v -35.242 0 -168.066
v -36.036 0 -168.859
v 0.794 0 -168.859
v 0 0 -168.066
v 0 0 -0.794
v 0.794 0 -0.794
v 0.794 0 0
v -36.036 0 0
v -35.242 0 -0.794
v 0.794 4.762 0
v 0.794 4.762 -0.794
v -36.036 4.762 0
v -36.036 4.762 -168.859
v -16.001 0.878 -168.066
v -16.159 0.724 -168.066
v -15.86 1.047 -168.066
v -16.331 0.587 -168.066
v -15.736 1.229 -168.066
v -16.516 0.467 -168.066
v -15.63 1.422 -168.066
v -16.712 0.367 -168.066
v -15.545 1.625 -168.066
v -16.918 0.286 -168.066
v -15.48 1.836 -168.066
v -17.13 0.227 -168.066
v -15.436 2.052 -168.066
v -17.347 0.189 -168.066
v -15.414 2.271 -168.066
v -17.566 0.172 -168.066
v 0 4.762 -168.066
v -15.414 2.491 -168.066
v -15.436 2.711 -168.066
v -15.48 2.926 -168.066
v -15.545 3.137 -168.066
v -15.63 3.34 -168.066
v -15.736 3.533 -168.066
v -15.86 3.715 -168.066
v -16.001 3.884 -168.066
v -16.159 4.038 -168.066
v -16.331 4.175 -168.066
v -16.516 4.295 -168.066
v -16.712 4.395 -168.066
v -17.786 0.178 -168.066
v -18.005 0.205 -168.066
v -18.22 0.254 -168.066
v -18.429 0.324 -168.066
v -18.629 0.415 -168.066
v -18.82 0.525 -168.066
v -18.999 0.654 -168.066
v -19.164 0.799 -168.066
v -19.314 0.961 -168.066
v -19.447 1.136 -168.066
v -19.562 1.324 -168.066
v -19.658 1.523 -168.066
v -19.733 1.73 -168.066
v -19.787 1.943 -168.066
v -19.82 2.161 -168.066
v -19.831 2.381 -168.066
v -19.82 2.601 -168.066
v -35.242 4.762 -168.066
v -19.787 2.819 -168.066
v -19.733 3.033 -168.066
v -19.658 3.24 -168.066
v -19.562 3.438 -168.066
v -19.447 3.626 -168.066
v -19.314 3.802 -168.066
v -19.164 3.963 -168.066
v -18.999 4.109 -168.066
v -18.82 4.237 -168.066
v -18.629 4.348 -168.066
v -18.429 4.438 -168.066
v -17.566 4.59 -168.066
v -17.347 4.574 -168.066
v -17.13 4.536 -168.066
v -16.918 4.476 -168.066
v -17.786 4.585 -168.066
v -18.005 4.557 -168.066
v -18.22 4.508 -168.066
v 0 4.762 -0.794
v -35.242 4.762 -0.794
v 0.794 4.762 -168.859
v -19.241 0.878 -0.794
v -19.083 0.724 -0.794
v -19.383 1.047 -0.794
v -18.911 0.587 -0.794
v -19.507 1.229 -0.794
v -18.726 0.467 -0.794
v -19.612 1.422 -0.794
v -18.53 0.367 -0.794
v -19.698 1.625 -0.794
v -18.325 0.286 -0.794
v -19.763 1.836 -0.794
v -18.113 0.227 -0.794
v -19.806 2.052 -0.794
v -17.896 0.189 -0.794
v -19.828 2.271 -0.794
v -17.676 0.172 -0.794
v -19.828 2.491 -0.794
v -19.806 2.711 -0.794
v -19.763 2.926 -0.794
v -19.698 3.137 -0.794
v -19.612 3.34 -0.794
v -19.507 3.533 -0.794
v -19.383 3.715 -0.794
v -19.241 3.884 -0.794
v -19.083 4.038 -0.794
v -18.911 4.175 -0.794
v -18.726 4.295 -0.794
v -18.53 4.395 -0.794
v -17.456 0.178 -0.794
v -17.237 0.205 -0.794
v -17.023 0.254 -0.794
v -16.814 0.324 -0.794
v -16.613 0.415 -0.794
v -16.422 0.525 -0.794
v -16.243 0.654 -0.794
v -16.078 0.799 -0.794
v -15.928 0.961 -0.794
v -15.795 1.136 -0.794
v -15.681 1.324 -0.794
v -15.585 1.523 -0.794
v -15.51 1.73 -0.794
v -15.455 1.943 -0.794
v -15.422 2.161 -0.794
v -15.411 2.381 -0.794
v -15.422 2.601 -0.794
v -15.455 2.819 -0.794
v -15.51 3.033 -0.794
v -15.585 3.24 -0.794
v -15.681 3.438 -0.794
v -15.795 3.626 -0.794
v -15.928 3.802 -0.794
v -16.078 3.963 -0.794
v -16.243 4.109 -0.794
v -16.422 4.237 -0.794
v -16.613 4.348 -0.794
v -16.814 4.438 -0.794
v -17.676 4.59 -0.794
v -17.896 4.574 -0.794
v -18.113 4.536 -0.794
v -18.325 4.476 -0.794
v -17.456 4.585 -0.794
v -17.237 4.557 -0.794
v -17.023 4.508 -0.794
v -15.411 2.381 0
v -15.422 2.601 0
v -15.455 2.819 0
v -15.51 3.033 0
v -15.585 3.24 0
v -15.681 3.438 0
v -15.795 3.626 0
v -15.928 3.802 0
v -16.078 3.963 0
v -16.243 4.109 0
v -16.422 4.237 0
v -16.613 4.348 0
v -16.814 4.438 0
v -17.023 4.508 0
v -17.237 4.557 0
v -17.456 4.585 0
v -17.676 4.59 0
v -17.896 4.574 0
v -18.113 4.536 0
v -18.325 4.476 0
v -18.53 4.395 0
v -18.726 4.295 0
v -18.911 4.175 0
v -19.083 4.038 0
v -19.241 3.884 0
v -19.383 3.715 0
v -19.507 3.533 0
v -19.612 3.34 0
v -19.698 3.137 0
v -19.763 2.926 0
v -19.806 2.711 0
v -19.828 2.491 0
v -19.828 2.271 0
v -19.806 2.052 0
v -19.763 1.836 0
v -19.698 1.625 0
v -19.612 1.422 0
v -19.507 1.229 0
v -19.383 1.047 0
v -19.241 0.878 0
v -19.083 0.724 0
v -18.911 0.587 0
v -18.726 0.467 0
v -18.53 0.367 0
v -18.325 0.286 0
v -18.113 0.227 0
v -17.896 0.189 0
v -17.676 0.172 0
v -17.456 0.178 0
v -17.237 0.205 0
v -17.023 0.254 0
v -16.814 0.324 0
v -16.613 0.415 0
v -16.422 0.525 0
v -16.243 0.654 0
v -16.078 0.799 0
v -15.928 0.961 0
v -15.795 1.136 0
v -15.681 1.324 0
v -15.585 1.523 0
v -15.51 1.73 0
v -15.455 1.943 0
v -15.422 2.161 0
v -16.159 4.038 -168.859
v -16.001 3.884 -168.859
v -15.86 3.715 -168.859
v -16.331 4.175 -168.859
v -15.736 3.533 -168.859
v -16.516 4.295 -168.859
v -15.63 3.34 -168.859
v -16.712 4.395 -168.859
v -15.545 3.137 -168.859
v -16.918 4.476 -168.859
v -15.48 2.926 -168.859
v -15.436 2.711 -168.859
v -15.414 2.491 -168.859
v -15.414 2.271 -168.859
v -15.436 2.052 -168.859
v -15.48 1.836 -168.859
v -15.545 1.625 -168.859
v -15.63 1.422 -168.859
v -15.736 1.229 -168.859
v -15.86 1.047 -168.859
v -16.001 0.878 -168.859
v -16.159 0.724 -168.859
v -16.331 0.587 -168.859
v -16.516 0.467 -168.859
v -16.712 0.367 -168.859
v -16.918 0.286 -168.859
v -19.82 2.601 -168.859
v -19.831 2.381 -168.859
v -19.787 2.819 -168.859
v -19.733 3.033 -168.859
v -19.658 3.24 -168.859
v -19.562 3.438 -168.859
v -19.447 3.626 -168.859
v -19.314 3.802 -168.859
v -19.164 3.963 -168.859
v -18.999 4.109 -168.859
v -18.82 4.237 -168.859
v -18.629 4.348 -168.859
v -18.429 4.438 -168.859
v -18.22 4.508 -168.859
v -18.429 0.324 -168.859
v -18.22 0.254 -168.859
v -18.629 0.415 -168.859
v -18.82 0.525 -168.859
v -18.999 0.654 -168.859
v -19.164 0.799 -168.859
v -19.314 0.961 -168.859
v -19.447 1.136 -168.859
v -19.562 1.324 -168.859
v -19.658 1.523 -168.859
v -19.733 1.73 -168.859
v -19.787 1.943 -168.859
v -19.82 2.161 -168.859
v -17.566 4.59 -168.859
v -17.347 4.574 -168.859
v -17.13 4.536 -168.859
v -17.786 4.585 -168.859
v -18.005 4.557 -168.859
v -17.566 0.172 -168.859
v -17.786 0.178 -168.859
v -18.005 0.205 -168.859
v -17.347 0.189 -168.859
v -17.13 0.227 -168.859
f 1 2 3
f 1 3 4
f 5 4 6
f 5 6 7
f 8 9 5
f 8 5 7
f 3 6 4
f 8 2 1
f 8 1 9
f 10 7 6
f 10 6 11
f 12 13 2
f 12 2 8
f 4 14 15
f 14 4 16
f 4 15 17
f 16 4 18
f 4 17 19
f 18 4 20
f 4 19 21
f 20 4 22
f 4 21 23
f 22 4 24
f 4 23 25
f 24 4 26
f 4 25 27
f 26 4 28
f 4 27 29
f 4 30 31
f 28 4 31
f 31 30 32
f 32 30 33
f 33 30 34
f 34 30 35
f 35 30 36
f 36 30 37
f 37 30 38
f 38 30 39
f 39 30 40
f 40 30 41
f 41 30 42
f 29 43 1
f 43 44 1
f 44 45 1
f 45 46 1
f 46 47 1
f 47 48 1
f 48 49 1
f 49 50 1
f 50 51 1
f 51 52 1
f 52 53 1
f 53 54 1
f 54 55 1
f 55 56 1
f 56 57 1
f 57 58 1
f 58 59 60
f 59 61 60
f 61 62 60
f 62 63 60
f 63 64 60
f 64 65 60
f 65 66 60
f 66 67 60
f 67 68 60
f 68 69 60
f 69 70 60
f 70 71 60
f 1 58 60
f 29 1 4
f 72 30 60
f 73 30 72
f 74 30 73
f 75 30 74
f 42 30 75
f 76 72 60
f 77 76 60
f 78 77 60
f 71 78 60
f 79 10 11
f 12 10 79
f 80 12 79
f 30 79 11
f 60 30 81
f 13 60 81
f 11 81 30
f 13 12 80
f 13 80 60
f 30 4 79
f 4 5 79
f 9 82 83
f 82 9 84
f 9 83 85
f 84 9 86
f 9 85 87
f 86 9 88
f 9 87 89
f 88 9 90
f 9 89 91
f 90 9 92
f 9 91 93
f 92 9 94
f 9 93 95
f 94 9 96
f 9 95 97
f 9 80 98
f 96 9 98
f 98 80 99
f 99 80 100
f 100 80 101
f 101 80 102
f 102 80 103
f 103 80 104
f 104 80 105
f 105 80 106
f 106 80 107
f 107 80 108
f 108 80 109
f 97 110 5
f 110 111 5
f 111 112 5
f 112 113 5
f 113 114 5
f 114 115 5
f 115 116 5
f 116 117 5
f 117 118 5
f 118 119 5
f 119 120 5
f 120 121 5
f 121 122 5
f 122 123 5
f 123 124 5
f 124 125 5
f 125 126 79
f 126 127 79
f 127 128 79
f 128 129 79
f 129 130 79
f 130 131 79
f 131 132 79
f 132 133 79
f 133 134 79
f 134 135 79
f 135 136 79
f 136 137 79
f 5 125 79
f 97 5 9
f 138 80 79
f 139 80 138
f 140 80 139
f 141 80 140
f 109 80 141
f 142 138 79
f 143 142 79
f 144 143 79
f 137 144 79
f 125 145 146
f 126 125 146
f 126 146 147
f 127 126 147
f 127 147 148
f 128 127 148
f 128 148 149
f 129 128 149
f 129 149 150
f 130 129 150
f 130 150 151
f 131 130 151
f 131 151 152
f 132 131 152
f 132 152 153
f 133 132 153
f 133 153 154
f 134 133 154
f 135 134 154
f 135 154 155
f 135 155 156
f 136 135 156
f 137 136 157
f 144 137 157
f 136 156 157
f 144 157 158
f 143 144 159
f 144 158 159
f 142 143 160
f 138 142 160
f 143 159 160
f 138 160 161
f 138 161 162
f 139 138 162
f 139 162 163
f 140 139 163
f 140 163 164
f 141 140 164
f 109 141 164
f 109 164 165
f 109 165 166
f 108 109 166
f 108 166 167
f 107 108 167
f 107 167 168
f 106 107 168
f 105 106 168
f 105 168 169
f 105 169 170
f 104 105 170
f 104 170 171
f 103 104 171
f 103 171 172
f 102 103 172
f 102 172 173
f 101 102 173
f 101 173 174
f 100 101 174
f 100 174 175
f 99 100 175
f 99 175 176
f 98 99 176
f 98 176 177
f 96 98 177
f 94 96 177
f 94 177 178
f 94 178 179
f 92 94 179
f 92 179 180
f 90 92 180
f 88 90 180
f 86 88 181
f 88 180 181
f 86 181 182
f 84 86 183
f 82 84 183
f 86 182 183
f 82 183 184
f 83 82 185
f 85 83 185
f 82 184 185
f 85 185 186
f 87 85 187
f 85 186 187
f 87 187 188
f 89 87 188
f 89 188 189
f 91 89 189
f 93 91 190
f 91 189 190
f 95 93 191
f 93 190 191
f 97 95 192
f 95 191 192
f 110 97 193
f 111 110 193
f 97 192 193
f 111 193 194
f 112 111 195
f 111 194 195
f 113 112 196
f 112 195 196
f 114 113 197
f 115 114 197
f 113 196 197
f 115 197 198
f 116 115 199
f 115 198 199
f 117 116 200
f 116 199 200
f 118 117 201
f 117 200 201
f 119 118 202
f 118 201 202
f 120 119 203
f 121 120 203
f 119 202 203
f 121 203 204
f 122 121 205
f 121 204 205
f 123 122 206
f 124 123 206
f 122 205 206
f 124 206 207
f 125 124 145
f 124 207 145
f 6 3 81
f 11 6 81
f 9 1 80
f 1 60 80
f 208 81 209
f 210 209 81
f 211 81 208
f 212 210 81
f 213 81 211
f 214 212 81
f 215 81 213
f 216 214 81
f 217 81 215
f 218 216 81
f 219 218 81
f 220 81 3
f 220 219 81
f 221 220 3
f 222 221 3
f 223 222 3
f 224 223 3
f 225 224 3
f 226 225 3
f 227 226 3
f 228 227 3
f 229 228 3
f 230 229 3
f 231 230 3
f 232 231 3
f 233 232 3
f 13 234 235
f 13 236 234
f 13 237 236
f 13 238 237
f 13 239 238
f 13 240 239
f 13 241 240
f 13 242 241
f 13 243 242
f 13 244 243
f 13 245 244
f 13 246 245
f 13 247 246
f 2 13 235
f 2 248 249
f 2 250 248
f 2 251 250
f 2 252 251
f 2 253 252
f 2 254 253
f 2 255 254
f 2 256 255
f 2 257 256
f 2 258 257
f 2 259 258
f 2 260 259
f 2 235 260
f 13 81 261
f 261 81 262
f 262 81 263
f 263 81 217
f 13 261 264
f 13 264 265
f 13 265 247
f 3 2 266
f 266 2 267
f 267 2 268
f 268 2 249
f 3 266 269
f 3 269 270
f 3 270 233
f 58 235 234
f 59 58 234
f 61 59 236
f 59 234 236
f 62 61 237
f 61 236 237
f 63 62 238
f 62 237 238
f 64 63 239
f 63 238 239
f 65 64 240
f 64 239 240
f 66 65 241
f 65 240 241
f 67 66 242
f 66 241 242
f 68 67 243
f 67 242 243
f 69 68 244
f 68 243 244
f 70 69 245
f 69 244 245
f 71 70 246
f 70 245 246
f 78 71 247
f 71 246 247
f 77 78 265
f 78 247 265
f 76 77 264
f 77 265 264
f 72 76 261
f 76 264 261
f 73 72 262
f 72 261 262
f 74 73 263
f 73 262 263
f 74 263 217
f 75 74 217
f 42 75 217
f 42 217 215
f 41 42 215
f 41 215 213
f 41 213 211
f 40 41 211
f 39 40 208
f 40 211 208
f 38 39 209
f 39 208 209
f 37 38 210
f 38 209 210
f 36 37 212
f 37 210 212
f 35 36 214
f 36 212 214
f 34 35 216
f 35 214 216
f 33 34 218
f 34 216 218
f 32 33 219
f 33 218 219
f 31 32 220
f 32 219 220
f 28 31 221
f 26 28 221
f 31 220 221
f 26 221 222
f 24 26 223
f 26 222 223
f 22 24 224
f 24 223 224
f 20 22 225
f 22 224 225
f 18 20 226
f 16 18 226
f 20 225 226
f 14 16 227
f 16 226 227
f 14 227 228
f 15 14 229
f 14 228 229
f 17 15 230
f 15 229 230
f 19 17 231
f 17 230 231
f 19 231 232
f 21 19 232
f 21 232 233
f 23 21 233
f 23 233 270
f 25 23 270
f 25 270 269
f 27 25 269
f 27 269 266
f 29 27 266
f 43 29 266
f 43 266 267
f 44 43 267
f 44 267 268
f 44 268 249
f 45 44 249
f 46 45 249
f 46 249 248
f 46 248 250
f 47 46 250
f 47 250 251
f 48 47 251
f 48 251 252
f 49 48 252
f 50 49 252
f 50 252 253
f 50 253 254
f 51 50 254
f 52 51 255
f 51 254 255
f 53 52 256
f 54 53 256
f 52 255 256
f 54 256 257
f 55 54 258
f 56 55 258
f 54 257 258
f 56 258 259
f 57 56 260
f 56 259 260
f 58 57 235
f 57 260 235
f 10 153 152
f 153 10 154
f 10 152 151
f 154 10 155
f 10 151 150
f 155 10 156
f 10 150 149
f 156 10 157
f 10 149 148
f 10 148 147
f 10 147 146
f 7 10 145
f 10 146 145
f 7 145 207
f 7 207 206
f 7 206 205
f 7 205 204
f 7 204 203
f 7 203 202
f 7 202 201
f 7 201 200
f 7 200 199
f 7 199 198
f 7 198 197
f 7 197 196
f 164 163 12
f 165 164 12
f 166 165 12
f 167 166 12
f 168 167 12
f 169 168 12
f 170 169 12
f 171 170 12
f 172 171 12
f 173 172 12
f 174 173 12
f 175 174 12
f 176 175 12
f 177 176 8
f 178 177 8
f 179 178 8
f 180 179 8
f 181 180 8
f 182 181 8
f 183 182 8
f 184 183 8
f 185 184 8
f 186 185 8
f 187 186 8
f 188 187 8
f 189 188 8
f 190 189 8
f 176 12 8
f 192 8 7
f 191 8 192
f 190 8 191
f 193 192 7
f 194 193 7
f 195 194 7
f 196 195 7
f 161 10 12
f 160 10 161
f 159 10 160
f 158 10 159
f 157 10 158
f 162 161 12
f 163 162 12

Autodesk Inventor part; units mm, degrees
ref_plane "YZ Plane" through (0, 0, 0) normal (1, 0, 0) x (0, 1, 0)
ref_plane "XZ Plane" through (0, 0, 0) normal (0, 1, 0) x (-1, 0, 0)
ref_plane "XY Plane" through (0, 0, 0) normal (0, 0, 1) x (1, 0, 0)
sketch "Sketch1" plane through (0, 0, 0) normal (1, 0, 0) x (0, 1, 0)
  line L0 (0, 0) -> (4.7625, 0)
  line L1 (4.7625, 0) -> (4.7625, -168.8592)
  line L2 (4.7625, -168.8592) -> (0, -168.8592)
  line L3 (0, -168.8592) -> (0, 0)
  dimension "d1" = 4.7625
  dimension "d2" = 168.8592
extrude "Extrusion1" add sketch "Sketch1" along normal blind 0.7937
sketch "Sketch2" plane through (0, 0, -168.8592) normal (0, 0, -1) x (-1, 0, 0)
  line L0 (-0.7937, 0) -> (-0.7937, 4.7625) projected
  line L1 (-0.7937, 0) -> (36.0362, 0)
  line L2 (36.0362, 0) -> (36.0362, 4.7625)
  line L3 (36.0362, 4.7625) -> (-0.7937, 4.7625)
  line L4 (-0.7937, 4.7625) -> (-0.7937, 0)
  point P0 (0, 0)
  dimension "d5" = 36.83
  dimension "d6" = 4.7625
extrude "Extrusion2" add sketch "Sketch2" against normal blind 0.7937
sketch "Sketch3" plane through (-36.0362, 0, -168.8592) normal (-1, 0, 0) x (0, 0, 1)
  line L0 (168.8592, 4.7625) -> (168.8592, 0) projected
  line L1 (0, 0) -> (168.8592, 0)
  line L2 (168.8592, 0) -> (168.8592, 4.7625)
  line L3 (168.8592, 4.7625) -> (0, 4.7625)
  line L4 (0, 4.7625) -> (0, 0)
extrude "Extrusion3" add sketch "Sketch3" against normal blind 0.7937
sketch "Sketch4" plane through (-36.0362, 0, 0) normal (0, 0, 1) x (1, 0, 0)
  line L0 (0, 0) -> (0, 4.7625) projected
  line L1 (36.0362, 4.7625) -> (36.83, 4.7625) projected
  line L2 (0, 0) -> (36.83, 0)
  line L3 (36.83, 0) -> (36.83, 4.7625)
  line L4 (36.83, 4.7625) -> (0, 4.7625)
  line L5 (0, 4.7625) -> (0, 0)
  point P0 (36.0362, 0)
extrude "Extrusion4" add sketch "Sketch4" against normal blind 0.7937
sketch "Sketch7" plane through (-36.0362, 0, 0) normal (0, 0, 1) x (1, 0, 0)
  circle A0 centre (18.415, 2.3812) radius 2.2098
extrude "Extrusion5" cut sketch "Sketch7" against normal blind 0.7937
sketch "Sketch6" plane through (0.7937, 0, -168.8592) normal (0, 0, -1) x (-1, 0, 0)
  circle A0 centre (18.415, 2.3812) radius 2.2098
extrude "Extrusion6" cut sketch "Sketch6" against normal blind 0.7937
properties part number "Back rubber bands"
